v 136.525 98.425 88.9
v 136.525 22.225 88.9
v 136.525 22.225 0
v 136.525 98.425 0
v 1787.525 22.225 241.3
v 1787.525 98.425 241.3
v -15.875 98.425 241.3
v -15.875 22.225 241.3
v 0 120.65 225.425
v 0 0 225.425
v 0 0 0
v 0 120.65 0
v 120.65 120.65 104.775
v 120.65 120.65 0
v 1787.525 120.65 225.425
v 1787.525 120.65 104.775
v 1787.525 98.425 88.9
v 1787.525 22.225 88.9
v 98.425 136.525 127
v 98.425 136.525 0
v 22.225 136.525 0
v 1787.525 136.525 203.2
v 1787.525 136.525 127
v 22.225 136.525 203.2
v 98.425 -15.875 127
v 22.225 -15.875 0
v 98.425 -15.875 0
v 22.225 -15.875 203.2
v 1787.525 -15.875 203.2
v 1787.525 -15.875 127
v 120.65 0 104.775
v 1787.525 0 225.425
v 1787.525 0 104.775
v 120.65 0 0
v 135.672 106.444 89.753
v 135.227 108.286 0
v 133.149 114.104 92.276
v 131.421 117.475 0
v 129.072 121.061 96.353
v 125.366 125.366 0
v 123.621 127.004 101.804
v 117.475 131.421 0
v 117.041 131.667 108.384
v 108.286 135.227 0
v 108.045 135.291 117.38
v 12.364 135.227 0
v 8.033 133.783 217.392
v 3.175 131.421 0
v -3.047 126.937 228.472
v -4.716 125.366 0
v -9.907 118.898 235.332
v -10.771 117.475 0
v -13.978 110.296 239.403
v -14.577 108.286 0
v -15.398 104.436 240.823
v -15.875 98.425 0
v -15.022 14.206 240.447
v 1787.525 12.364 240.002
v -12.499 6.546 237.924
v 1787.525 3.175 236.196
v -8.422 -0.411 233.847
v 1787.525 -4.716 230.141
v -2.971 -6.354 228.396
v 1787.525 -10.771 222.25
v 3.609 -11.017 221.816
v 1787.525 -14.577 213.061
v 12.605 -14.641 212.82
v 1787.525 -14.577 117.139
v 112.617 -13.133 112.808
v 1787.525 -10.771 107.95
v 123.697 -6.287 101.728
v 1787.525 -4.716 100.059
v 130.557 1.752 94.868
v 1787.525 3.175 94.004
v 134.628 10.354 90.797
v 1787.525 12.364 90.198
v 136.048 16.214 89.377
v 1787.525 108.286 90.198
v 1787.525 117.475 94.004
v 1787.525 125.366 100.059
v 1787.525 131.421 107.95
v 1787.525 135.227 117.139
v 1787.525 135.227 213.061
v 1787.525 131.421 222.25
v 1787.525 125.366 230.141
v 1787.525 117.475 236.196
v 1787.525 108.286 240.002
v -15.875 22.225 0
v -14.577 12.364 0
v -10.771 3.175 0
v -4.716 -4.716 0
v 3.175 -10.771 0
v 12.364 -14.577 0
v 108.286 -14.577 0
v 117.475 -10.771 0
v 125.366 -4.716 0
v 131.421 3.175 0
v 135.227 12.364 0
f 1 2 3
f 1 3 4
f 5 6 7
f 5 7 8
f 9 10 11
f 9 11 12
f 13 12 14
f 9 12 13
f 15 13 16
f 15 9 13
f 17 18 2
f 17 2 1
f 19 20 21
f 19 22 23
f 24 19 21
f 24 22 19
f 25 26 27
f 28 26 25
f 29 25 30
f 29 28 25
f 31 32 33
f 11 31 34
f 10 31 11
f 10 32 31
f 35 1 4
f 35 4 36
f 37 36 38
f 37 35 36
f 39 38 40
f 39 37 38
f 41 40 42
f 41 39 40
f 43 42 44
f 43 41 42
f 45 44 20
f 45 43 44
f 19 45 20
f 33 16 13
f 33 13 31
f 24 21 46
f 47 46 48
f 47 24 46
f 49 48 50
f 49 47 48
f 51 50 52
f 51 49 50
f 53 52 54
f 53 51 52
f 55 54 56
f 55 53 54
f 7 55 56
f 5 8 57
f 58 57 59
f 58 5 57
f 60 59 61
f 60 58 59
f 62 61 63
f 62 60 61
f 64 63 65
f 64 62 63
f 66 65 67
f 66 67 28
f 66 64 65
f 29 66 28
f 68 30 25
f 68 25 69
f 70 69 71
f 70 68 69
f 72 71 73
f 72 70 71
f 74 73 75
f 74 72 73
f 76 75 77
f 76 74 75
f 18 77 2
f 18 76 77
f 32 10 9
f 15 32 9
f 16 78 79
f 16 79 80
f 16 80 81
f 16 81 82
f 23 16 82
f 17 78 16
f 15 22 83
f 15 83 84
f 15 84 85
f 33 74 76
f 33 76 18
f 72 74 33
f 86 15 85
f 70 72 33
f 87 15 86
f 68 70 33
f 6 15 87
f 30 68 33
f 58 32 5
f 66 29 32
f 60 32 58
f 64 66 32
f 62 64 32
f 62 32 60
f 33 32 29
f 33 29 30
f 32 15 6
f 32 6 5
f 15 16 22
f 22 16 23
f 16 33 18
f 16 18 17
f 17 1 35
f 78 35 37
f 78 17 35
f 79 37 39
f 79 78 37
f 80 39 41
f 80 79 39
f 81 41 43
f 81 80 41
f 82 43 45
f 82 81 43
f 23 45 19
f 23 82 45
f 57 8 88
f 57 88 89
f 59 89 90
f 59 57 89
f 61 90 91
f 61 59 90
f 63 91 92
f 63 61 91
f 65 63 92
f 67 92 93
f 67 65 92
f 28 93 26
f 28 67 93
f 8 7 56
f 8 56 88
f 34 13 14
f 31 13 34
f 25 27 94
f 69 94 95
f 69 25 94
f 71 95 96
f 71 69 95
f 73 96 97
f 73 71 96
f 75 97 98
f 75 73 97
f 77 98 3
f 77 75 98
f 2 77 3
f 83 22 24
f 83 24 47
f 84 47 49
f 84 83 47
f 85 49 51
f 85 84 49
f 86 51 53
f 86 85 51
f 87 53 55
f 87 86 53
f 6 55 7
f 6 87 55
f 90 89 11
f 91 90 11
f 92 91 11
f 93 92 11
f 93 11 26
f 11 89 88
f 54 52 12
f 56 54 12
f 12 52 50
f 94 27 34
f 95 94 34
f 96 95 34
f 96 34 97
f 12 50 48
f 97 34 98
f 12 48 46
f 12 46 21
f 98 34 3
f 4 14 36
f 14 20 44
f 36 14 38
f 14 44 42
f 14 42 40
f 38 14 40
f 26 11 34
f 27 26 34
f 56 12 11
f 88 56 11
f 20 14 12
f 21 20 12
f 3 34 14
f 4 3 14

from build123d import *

# Parameters (mm, degrees)
SKETCH12_W = 120.65
SKETCH12_H = 120.65


with BuildPart() as part:
    # Sweep1: sweep along a curve in space
    with BuildLine() as sweep1_path:
        Line((60.325, 60.325, 0), (60.325, 60.325, 165.1))
        Line((60.325, 60.325, 165.1), (1787.525, 60.325, 165.1))
    # Sketch12 → Sweep1 (sweep)
    with BuildSketch(Plane.XY):
        with BuildLine():
            Line((22.225, 136.525), (98.425, 136.525))
            ThreePointArc((98.425, 136.525), (125.365768363, 125.365768363), (136.525, 98.425))
            Line((136.525, 98.425), (136.525, 22.225))
            ThreePointArc((136.525, 22.225), (125.365768363, -4.715768363), (98.425, -15.875))
            Line((98.425, -15.875), (22.225, -15.875))
            ThreePointArc((22.225, -15.875), (-4.715768363, -4.715768363), (-15.875, 22.225))
            Line((-15.875, 22.225), (-15.875, 98.425))
            ThreePointArc((-15.875, 98.425), (-4.715768363, 125.365768363), (22.225, 136.525))
        make_face()
        with Locations((60.325, 60.325)):
            Rectangle(SKETCH12_W, SKETCH12_H, mode=Mode.SUBTRACT)
    sweep(path=sweep1_path.line, transition=Transition.RIGHT)


solid = part.part
